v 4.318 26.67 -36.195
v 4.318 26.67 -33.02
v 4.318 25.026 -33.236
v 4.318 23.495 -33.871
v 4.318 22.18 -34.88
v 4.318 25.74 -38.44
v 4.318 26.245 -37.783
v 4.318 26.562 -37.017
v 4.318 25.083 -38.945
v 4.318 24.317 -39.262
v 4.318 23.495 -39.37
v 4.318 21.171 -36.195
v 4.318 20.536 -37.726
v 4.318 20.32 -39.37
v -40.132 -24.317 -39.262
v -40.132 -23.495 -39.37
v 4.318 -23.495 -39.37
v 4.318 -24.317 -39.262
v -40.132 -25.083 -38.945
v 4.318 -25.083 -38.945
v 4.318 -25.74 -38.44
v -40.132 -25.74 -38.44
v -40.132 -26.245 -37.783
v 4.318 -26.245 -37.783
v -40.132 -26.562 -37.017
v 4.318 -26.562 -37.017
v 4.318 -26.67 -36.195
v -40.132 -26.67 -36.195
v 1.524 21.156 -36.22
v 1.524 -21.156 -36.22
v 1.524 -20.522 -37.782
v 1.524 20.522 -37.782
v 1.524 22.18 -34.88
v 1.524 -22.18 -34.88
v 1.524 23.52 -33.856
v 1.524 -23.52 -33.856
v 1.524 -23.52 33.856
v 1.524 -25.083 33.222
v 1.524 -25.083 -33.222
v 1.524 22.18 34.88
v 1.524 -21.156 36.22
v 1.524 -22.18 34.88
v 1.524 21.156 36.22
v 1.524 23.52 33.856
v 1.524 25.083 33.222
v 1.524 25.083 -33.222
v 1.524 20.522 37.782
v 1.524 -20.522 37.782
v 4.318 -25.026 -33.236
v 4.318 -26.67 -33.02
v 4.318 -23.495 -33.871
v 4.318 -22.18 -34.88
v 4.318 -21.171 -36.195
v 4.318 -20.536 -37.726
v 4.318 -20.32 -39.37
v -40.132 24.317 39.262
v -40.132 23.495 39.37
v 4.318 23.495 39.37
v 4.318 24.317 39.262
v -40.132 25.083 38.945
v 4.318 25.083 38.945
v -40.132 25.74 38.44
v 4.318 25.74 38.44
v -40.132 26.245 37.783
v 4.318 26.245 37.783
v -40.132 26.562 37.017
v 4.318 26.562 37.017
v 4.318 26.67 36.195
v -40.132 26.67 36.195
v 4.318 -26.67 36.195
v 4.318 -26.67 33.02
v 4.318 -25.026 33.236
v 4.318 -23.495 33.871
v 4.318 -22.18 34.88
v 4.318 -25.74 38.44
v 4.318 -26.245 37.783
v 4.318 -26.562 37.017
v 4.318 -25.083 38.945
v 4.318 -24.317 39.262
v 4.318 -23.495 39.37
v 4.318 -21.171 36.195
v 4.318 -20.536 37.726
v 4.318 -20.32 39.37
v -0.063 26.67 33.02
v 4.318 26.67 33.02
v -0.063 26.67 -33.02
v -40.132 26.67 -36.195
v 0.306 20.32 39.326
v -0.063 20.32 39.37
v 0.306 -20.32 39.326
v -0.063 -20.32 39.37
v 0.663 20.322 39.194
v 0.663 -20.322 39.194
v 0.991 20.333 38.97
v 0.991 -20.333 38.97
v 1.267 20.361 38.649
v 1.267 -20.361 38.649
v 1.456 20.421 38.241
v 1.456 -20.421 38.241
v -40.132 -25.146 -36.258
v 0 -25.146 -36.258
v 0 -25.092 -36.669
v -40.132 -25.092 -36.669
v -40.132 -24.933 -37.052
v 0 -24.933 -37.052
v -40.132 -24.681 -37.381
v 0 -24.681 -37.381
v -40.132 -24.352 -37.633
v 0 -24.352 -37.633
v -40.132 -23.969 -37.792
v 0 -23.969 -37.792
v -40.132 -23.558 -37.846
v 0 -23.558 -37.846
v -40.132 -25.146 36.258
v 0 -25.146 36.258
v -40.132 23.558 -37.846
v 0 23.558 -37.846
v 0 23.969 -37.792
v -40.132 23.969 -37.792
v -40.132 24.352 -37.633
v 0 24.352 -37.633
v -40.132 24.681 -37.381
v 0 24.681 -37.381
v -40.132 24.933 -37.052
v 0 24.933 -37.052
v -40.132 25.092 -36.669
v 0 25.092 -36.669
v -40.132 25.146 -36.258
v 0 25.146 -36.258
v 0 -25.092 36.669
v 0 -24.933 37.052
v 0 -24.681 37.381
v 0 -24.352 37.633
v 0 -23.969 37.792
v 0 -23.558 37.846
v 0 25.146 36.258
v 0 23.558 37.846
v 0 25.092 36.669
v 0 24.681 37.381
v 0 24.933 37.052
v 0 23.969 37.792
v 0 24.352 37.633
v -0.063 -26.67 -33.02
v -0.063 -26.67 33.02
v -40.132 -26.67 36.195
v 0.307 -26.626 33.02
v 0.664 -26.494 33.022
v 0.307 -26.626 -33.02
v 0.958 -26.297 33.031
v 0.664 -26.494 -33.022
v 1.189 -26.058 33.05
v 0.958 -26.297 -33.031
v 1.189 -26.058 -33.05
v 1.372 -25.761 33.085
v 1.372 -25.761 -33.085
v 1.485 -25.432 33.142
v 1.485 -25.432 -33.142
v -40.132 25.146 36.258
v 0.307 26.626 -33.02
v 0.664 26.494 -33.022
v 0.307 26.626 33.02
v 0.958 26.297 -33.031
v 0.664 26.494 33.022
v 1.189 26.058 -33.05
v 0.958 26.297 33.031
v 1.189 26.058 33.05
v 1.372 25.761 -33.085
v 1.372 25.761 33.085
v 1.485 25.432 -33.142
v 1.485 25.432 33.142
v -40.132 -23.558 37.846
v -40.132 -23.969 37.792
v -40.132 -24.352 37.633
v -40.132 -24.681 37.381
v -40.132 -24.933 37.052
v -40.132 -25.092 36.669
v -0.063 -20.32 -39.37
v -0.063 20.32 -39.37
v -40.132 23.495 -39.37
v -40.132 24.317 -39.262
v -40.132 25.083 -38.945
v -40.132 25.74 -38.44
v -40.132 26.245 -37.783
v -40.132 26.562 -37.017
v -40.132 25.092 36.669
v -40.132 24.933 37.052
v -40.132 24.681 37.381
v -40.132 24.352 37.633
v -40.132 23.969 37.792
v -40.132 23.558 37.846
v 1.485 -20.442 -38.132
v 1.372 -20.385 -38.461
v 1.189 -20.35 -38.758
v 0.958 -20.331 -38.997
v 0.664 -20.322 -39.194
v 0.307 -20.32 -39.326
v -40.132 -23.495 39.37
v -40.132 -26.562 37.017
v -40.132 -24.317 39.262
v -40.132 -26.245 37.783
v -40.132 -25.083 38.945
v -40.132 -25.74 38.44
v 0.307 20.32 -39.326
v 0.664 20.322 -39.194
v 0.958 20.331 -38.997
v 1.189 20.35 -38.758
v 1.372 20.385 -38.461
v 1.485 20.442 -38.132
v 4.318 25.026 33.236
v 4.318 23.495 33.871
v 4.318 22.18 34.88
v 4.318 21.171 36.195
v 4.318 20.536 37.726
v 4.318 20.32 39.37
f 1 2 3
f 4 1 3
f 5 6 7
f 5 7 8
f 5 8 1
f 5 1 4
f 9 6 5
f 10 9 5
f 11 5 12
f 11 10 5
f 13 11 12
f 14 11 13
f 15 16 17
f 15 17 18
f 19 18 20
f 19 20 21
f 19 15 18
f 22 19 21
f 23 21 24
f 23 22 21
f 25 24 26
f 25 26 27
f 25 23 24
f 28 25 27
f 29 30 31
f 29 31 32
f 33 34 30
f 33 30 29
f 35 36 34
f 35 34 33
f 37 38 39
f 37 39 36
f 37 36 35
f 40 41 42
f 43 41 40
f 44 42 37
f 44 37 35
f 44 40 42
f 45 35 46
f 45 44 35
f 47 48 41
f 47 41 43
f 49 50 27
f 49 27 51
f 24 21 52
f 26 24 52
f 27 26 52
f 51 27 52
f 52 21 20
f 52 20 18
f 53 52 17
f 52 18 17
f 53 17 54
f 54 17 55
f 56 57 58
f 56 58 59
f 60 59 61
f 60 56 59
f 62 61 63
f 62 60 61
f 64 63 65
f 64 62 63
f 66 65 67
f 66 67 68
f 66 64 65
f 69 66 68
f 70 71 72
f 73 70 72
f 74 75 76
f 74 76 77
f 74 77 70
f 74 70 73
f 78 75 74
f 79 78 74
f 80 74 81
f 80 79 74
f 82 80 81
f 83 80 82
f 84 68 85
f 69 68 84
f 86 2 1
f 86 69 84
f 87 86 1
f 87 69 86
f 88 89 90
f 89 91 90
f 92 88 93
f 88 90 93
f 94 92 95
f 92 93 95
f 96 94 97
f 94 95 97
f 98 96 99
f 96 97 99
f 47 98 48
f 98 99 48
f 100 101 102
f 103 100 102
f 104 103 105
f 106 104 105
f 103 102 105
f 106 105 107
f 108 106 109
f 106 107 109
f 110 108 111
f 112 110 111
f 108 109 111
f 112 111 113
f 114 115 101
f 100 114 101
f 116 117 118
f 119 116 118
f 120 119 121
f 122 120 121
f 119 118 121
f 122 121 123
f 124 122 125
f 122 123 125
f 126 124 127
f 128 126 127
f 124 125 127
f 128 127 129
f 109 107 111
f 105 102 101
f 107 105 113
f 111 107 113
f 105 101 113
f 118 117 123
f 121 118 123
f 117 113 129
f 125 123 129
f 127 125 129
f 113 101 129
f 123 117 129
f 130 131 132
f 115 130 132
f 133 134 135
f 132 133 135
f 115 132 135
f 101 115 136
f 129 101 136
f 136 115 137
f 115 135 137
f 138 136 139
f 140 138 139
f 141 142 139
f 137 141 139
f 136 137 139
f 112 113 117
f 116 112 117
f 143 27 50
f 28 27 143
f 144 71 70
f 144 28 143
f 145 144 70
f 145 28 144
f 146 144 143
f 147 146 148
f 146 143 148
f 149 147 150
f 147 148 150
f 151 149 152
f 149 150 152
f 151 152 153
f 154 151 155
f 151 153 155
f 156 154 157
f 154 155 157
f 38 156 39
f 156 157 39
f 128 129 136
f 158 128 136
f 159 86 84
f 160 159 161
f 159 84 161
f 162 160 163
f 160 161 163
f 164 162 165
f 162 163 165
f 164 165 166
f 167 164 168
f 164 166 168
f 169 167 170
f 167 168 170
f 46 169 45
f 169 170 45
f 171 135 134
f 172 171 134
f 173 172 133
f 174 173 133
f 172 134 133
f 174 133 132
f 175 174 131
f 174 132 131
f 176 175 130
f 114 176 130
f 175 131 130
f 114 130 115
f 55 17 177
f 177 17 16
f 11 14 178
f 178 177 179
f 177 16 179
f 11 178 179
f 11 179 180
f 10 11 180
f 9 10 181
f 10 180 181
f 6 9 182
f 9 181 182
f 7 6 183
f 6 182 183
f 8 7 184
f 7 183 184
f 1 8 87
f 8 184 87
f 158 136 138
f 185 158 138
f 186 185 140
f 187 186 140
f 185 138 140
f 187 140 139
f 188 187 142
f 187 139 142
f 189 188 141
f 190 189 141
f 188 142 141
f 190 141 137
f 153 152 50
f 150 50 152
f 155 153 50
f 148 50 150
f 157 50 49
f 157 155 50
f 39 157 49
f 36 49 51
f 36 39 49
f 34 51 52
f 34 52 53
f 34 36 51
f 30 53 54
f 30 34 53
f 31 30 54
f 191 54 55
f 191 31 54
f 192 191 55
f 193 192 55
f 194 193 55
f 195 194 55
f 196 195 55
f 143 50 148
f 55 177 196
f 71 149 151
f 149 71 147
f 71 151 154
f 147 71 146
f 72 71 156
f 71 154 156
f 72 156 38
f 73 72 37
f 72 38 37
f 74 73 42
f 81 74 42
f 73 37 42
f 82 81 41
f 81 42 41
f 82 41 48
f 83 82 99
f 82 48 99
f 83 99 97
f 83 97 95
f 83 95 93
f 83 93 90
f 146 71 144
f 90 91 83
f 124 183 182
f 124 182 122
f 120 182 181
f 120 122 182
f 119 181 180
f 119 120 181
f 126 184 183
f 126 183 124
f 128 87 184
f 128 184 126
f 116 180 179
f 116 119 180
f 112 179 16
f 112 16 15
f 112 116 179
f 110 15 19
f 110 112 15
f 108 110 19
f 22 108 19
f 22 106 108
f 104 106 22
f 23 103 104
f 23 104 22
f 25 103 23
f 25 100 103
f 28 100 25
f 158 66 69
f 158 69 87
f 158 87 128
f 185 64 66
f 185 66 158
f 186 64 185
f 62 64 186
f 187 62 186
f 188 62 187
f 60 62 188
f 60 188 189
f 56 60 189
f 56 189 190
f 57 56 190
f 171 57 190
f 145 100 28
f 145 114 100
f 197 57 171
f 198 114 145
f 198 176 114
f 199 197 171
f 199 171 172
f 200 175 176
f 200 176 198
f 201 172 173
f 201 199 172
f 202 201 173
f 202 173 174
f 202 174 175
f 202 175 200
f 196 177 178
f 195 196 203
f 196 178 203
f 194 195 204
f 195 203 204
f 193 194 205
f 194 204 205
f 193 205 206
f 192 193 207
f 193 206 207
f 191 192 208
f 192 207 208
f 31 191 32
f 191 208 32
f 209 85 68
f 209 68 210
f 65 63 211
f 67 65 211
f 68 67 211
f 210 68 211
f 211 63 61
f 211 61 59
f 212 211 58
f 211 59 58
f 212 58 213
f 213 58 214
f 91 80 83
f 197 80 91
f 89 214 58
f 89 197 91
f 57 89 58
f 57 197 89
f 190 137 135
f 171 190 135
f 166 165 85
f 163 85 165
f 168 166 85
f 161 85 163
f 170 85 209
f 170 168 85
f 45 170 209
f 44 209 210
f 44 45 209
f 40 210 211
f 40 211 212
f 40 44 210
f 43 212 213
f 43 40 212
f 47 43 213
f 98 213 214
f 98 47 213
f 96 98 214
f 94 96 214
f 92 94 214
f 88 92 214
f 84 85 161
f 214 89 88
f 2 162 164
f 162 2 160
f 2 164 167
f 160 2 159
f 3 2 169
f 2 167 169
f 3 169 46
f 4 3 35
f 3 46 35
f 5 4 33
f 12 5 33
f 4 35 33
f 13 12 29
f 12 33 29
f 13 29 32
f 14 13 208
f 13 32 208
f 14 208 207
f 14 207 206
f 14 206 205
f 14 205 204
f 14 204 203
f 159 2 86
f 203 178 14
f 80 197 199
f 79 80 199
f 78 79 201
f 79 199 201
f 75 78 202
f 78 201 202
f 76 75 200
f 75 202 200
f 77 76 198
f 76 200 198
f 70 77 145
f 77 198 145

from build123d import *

# Parameters (mm, degrees)
F1_DEPTH = 1.524
F3_DEPTH = 40.132
F5_DEPTH = 2.794
F8_R     = 1.5875
F9_R     = 1.5875
F10_R    = 1.5875
F11_R    = 1.5875


with BuildPart() as f1:
    # F0 (on Right) → F1 (new body)
    with BuildSketch(Plane.YZ):
        with BuildLine():
            ThreePointArc((26.67, 36.195), (25.7400640303, 38.4400640303), (23.495, 39.37))
            Line((23.495, 39.37), (-23.495, 39.37))
            ThreePointArc((-23.495, 39.37), (-25.7400640303, 38.4400640303), (-26.67, 36.195))
            Line((-26.67, 36.195), (-26.67, -36.195))
            ThreePointArc((-26.67, -36.195), (-25.7400640303, -38.4400640303), (-23.495, -39.37))
            Line((-23.495, -39.37), (23.495, -39.37))
            ThreePointArc((23.495, -39.37), (25.7400640303, -38.4400640303), (26.67, -36.195))
            Line((26.67, -36.195), (26.67, 36.195))
        make_face()
    extrude(amount=F1_DEPTH)

    # F2 (on face) → F3 (join)
    with BuildSketch(Plane(origin=(0, 0, 0), x_dir=(0, -1, 0), z_dir=(-1, 0, 0))):
        with BuildLine():
            Line((23.495, 39.37), (-23.495, 39.37))
            ThreePointArc((-23.495, 39.37), (-25.7400640303, 38.4400640303), (-26.67, 36.195))
            Line((-26.67, 36.195), (-26.67, -36.195))
            ThreePointArc((-26.67, -36.195), (-25.7400640303, -38.4400640303), (-23.495, -39.37))
            Line((-23.495, -39.37), (23.495, -39.37))
            ThreePointArc((23.495, -39.37), (25.7400640303, -38.4400640303), (26.67, -36.195))
            Line((26.67, -36.195), (26.67, 36.195))
            ThreePointArc((26.67, 36.195), (25.7400640303, 38.4400640303), (23.495, 39.37))
        make_face()
        with BuildLine():
            ThreePointArc((25.146, -36.2585), (24.6810320151, -37.3810320151), (23.5585, -37.846))
            Line((23.5585, -37.846), (-23.5585, -37.846))
            ThreePointArc((-23.5585, -37.846), (-24.6810320151, -37.3810320151), (-25.146, -36.2585))
            Line((-25.146, -36.2585), (-25.146, 36.2585))
            ThreePointArc((-25.146, 36.2585), (-24.6810320151, 37.3810320151), (-23.5585, 37.846))
            Line((-23.5585, 37.846), (23.5585, 37.846))
            ThreePointArc((23.5585, 37.846), (24.6810320151, 37.3810320151), (25.146, 36.2585))
            Line((25.146, 36.2585), (25.146, -36.2585))
        make_face(mode=Mode.SUBTRACT)
    extrude(amount=F3_DEPTH)

    # F4 (on face) → F5 (join)
    with BuildSketch(Plane.YZ.offset(1.524)):
        with BuildLine():
            ThreePointArc((-26.67, 33.02), (-22.1798719395, 34.8798719395), (-20.32, 39.37))
            Line((-20.32, 39.37), (-23.495, 39.37))
            ThreePointArc((-23.495, 39.37), (-25.7400640303, 38.4400640303), (-26.67, 36.195))
            Line((-26.67, 36.195), (-26.67, 33.02))
        make_face()
    extrude(amount=F5_DEPTH)


with BuildPart() as f6_1:
    # F6: instance of F1
    add(f1.part.mirror(Plane.XY))


with BuildPart() as f1_1:
    add(f1.part)

    add(f6_1.part)  # F7 merges F6_1
    # F7: F6_1, F1 across plane
    add(f6_1.part.mirror(Plane.XZ))
    add(f1.part.mirror(Plane.XZ))

    # F8
    f8_edges = [f1_1.edges().sort_by_distance(p)[0] for p in [
        (1.524, -26.67, 0),
    ]]
    fillet(f8_edges, radius=F8_R)

    # F9
    f9_edges = [f1_1.edges().sort_by_distance(p)[0] for p in [
        (1.524, 0, -39.37),
    ]]
    fillet(f9_edges, radius=F9_R)

    # F10
    f10_edges = [f1_1.edges().sort_by_distance(p)[0] for p in [
        (1.524, 26.67, 0),
    ]]
    fillet(f10_edges, radius=F10_R)

    # F11
    f11_edges = [f1_1.edges().sort_by_distance(p)[0] for p in [
        (1.524, 0, 39.37),
    ]]
    fillet(f11_edges, radius=F11_R)


solid = f1_1.part
